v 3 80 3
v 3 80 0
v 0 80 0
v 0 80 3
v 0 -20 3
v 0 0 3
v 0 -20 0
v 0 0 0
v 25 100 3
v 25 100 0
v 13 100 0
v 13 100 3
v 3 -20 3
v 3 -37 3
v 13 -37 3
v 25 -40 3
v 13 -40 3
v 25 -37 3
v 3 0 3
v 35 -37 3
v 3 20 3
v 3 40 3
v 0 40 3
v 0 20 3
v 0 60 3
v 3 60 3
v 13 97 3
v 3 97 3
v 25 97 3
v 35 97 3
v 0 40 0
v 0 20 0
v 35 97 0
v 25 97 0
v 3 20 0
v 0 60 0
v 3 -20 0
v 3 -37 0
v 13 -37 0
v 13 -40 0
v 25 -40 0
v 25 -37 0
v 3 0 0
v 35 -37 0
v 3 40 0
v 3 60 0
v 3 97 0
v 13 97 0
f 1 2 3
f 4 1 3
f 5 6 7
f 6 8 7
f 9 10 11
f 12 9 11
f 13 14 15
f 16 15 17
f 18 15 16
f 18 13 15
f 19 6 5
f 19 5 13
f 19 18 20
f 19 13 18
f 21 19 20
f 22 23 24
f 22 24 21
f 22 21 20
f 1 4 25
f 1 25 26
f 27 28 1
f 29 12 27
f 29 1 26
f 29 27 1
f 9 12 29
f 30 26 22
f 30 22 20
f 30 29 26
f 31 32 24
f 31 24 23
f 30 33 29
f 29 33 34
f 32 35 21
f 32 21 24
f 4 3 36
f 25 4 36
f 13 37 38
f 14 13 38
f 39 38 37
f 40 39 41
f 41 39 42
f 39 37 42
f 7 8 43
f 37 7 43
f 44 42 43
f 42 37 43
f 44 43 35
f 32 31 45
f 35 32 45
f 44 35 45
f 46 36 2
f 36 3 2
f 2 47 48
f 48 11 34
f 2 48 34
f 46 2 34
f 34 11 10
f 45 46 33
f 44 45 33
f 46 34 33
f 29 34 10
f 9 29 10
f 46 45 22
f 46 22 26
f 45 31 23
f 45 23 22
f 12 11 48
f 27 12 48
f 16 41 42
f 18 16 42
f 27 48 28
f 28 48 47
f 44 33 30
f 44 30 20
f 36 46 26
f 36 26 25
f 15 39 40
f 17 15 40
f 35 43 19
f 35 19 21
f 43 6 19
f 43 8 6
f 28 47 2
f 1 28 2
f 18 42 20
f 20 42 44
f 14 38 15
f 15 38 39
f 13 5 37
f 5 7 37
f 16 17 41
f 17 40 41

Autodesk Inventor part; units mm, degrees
ref_plane "YZ Plane" through (0, 0, 0) normal (1, 0, 0) x (0, 1, 0)
ref_plane "XZ Plane" through (0, 0, 0) normal (0, 1, 0) x (-1, 0, 0)
ref_plane "XY Plane" through (0, 0, 0) normal (0, 0, 1) x (1, 0, 0)
sketch "Sketch1" plane through (0, 0, 0) normal (0, 0, 1) x (1, 0, 0)
  line L0 (0, 0) -> (0, -20)
  line L1 (0, -20) -> (3, -20)
  line L2 (3, -20) -> (3, -37)
  line L3 (3, -37) -> (13, -37)
  line L4 (13, -37) -> (13, -40)
  line L5 (13, -40) -> (25, -40)
  line L6 (25, -40) -> (25, -37)
  line L7 (25, -37) -> (35, -37)
  line L8 (0, 0) -> (3, 0)
  line L9 (3, 0) -> (3, 20)
  line L10 (3, 20) -> (0, 20)
  line L11 (0, 20) -> (0, 30)
  line L12 (0, 30) -> (3, 30)
  line L13 (3, 30) -> (35, 30)
  line L14 (35, 30) -> (35, -37)
  dimension "d0" = 20
  dimension "d1" = 3
  dimension "d2" = 17
  dimension "d3" = 10
  dimension "d4" = 3
  dimension "d5" = 12
  dimension "d6" = 3
  dimension "d7" = 10
  dimension "d8" = 3
  dimension "d9" = 20
  dimension "d10" = 3
  dimension "d11" = 10
  dimension "d12" = 3
  dimension "d13" = 32
extrude "Extrusion1" add sketch "Sketch1" along normal blind 3
mirror "Mirror1" about plane through (35, 30, 0) normal (0, 1, 0) of "Extrusion1"
properties part number "voorkant"
